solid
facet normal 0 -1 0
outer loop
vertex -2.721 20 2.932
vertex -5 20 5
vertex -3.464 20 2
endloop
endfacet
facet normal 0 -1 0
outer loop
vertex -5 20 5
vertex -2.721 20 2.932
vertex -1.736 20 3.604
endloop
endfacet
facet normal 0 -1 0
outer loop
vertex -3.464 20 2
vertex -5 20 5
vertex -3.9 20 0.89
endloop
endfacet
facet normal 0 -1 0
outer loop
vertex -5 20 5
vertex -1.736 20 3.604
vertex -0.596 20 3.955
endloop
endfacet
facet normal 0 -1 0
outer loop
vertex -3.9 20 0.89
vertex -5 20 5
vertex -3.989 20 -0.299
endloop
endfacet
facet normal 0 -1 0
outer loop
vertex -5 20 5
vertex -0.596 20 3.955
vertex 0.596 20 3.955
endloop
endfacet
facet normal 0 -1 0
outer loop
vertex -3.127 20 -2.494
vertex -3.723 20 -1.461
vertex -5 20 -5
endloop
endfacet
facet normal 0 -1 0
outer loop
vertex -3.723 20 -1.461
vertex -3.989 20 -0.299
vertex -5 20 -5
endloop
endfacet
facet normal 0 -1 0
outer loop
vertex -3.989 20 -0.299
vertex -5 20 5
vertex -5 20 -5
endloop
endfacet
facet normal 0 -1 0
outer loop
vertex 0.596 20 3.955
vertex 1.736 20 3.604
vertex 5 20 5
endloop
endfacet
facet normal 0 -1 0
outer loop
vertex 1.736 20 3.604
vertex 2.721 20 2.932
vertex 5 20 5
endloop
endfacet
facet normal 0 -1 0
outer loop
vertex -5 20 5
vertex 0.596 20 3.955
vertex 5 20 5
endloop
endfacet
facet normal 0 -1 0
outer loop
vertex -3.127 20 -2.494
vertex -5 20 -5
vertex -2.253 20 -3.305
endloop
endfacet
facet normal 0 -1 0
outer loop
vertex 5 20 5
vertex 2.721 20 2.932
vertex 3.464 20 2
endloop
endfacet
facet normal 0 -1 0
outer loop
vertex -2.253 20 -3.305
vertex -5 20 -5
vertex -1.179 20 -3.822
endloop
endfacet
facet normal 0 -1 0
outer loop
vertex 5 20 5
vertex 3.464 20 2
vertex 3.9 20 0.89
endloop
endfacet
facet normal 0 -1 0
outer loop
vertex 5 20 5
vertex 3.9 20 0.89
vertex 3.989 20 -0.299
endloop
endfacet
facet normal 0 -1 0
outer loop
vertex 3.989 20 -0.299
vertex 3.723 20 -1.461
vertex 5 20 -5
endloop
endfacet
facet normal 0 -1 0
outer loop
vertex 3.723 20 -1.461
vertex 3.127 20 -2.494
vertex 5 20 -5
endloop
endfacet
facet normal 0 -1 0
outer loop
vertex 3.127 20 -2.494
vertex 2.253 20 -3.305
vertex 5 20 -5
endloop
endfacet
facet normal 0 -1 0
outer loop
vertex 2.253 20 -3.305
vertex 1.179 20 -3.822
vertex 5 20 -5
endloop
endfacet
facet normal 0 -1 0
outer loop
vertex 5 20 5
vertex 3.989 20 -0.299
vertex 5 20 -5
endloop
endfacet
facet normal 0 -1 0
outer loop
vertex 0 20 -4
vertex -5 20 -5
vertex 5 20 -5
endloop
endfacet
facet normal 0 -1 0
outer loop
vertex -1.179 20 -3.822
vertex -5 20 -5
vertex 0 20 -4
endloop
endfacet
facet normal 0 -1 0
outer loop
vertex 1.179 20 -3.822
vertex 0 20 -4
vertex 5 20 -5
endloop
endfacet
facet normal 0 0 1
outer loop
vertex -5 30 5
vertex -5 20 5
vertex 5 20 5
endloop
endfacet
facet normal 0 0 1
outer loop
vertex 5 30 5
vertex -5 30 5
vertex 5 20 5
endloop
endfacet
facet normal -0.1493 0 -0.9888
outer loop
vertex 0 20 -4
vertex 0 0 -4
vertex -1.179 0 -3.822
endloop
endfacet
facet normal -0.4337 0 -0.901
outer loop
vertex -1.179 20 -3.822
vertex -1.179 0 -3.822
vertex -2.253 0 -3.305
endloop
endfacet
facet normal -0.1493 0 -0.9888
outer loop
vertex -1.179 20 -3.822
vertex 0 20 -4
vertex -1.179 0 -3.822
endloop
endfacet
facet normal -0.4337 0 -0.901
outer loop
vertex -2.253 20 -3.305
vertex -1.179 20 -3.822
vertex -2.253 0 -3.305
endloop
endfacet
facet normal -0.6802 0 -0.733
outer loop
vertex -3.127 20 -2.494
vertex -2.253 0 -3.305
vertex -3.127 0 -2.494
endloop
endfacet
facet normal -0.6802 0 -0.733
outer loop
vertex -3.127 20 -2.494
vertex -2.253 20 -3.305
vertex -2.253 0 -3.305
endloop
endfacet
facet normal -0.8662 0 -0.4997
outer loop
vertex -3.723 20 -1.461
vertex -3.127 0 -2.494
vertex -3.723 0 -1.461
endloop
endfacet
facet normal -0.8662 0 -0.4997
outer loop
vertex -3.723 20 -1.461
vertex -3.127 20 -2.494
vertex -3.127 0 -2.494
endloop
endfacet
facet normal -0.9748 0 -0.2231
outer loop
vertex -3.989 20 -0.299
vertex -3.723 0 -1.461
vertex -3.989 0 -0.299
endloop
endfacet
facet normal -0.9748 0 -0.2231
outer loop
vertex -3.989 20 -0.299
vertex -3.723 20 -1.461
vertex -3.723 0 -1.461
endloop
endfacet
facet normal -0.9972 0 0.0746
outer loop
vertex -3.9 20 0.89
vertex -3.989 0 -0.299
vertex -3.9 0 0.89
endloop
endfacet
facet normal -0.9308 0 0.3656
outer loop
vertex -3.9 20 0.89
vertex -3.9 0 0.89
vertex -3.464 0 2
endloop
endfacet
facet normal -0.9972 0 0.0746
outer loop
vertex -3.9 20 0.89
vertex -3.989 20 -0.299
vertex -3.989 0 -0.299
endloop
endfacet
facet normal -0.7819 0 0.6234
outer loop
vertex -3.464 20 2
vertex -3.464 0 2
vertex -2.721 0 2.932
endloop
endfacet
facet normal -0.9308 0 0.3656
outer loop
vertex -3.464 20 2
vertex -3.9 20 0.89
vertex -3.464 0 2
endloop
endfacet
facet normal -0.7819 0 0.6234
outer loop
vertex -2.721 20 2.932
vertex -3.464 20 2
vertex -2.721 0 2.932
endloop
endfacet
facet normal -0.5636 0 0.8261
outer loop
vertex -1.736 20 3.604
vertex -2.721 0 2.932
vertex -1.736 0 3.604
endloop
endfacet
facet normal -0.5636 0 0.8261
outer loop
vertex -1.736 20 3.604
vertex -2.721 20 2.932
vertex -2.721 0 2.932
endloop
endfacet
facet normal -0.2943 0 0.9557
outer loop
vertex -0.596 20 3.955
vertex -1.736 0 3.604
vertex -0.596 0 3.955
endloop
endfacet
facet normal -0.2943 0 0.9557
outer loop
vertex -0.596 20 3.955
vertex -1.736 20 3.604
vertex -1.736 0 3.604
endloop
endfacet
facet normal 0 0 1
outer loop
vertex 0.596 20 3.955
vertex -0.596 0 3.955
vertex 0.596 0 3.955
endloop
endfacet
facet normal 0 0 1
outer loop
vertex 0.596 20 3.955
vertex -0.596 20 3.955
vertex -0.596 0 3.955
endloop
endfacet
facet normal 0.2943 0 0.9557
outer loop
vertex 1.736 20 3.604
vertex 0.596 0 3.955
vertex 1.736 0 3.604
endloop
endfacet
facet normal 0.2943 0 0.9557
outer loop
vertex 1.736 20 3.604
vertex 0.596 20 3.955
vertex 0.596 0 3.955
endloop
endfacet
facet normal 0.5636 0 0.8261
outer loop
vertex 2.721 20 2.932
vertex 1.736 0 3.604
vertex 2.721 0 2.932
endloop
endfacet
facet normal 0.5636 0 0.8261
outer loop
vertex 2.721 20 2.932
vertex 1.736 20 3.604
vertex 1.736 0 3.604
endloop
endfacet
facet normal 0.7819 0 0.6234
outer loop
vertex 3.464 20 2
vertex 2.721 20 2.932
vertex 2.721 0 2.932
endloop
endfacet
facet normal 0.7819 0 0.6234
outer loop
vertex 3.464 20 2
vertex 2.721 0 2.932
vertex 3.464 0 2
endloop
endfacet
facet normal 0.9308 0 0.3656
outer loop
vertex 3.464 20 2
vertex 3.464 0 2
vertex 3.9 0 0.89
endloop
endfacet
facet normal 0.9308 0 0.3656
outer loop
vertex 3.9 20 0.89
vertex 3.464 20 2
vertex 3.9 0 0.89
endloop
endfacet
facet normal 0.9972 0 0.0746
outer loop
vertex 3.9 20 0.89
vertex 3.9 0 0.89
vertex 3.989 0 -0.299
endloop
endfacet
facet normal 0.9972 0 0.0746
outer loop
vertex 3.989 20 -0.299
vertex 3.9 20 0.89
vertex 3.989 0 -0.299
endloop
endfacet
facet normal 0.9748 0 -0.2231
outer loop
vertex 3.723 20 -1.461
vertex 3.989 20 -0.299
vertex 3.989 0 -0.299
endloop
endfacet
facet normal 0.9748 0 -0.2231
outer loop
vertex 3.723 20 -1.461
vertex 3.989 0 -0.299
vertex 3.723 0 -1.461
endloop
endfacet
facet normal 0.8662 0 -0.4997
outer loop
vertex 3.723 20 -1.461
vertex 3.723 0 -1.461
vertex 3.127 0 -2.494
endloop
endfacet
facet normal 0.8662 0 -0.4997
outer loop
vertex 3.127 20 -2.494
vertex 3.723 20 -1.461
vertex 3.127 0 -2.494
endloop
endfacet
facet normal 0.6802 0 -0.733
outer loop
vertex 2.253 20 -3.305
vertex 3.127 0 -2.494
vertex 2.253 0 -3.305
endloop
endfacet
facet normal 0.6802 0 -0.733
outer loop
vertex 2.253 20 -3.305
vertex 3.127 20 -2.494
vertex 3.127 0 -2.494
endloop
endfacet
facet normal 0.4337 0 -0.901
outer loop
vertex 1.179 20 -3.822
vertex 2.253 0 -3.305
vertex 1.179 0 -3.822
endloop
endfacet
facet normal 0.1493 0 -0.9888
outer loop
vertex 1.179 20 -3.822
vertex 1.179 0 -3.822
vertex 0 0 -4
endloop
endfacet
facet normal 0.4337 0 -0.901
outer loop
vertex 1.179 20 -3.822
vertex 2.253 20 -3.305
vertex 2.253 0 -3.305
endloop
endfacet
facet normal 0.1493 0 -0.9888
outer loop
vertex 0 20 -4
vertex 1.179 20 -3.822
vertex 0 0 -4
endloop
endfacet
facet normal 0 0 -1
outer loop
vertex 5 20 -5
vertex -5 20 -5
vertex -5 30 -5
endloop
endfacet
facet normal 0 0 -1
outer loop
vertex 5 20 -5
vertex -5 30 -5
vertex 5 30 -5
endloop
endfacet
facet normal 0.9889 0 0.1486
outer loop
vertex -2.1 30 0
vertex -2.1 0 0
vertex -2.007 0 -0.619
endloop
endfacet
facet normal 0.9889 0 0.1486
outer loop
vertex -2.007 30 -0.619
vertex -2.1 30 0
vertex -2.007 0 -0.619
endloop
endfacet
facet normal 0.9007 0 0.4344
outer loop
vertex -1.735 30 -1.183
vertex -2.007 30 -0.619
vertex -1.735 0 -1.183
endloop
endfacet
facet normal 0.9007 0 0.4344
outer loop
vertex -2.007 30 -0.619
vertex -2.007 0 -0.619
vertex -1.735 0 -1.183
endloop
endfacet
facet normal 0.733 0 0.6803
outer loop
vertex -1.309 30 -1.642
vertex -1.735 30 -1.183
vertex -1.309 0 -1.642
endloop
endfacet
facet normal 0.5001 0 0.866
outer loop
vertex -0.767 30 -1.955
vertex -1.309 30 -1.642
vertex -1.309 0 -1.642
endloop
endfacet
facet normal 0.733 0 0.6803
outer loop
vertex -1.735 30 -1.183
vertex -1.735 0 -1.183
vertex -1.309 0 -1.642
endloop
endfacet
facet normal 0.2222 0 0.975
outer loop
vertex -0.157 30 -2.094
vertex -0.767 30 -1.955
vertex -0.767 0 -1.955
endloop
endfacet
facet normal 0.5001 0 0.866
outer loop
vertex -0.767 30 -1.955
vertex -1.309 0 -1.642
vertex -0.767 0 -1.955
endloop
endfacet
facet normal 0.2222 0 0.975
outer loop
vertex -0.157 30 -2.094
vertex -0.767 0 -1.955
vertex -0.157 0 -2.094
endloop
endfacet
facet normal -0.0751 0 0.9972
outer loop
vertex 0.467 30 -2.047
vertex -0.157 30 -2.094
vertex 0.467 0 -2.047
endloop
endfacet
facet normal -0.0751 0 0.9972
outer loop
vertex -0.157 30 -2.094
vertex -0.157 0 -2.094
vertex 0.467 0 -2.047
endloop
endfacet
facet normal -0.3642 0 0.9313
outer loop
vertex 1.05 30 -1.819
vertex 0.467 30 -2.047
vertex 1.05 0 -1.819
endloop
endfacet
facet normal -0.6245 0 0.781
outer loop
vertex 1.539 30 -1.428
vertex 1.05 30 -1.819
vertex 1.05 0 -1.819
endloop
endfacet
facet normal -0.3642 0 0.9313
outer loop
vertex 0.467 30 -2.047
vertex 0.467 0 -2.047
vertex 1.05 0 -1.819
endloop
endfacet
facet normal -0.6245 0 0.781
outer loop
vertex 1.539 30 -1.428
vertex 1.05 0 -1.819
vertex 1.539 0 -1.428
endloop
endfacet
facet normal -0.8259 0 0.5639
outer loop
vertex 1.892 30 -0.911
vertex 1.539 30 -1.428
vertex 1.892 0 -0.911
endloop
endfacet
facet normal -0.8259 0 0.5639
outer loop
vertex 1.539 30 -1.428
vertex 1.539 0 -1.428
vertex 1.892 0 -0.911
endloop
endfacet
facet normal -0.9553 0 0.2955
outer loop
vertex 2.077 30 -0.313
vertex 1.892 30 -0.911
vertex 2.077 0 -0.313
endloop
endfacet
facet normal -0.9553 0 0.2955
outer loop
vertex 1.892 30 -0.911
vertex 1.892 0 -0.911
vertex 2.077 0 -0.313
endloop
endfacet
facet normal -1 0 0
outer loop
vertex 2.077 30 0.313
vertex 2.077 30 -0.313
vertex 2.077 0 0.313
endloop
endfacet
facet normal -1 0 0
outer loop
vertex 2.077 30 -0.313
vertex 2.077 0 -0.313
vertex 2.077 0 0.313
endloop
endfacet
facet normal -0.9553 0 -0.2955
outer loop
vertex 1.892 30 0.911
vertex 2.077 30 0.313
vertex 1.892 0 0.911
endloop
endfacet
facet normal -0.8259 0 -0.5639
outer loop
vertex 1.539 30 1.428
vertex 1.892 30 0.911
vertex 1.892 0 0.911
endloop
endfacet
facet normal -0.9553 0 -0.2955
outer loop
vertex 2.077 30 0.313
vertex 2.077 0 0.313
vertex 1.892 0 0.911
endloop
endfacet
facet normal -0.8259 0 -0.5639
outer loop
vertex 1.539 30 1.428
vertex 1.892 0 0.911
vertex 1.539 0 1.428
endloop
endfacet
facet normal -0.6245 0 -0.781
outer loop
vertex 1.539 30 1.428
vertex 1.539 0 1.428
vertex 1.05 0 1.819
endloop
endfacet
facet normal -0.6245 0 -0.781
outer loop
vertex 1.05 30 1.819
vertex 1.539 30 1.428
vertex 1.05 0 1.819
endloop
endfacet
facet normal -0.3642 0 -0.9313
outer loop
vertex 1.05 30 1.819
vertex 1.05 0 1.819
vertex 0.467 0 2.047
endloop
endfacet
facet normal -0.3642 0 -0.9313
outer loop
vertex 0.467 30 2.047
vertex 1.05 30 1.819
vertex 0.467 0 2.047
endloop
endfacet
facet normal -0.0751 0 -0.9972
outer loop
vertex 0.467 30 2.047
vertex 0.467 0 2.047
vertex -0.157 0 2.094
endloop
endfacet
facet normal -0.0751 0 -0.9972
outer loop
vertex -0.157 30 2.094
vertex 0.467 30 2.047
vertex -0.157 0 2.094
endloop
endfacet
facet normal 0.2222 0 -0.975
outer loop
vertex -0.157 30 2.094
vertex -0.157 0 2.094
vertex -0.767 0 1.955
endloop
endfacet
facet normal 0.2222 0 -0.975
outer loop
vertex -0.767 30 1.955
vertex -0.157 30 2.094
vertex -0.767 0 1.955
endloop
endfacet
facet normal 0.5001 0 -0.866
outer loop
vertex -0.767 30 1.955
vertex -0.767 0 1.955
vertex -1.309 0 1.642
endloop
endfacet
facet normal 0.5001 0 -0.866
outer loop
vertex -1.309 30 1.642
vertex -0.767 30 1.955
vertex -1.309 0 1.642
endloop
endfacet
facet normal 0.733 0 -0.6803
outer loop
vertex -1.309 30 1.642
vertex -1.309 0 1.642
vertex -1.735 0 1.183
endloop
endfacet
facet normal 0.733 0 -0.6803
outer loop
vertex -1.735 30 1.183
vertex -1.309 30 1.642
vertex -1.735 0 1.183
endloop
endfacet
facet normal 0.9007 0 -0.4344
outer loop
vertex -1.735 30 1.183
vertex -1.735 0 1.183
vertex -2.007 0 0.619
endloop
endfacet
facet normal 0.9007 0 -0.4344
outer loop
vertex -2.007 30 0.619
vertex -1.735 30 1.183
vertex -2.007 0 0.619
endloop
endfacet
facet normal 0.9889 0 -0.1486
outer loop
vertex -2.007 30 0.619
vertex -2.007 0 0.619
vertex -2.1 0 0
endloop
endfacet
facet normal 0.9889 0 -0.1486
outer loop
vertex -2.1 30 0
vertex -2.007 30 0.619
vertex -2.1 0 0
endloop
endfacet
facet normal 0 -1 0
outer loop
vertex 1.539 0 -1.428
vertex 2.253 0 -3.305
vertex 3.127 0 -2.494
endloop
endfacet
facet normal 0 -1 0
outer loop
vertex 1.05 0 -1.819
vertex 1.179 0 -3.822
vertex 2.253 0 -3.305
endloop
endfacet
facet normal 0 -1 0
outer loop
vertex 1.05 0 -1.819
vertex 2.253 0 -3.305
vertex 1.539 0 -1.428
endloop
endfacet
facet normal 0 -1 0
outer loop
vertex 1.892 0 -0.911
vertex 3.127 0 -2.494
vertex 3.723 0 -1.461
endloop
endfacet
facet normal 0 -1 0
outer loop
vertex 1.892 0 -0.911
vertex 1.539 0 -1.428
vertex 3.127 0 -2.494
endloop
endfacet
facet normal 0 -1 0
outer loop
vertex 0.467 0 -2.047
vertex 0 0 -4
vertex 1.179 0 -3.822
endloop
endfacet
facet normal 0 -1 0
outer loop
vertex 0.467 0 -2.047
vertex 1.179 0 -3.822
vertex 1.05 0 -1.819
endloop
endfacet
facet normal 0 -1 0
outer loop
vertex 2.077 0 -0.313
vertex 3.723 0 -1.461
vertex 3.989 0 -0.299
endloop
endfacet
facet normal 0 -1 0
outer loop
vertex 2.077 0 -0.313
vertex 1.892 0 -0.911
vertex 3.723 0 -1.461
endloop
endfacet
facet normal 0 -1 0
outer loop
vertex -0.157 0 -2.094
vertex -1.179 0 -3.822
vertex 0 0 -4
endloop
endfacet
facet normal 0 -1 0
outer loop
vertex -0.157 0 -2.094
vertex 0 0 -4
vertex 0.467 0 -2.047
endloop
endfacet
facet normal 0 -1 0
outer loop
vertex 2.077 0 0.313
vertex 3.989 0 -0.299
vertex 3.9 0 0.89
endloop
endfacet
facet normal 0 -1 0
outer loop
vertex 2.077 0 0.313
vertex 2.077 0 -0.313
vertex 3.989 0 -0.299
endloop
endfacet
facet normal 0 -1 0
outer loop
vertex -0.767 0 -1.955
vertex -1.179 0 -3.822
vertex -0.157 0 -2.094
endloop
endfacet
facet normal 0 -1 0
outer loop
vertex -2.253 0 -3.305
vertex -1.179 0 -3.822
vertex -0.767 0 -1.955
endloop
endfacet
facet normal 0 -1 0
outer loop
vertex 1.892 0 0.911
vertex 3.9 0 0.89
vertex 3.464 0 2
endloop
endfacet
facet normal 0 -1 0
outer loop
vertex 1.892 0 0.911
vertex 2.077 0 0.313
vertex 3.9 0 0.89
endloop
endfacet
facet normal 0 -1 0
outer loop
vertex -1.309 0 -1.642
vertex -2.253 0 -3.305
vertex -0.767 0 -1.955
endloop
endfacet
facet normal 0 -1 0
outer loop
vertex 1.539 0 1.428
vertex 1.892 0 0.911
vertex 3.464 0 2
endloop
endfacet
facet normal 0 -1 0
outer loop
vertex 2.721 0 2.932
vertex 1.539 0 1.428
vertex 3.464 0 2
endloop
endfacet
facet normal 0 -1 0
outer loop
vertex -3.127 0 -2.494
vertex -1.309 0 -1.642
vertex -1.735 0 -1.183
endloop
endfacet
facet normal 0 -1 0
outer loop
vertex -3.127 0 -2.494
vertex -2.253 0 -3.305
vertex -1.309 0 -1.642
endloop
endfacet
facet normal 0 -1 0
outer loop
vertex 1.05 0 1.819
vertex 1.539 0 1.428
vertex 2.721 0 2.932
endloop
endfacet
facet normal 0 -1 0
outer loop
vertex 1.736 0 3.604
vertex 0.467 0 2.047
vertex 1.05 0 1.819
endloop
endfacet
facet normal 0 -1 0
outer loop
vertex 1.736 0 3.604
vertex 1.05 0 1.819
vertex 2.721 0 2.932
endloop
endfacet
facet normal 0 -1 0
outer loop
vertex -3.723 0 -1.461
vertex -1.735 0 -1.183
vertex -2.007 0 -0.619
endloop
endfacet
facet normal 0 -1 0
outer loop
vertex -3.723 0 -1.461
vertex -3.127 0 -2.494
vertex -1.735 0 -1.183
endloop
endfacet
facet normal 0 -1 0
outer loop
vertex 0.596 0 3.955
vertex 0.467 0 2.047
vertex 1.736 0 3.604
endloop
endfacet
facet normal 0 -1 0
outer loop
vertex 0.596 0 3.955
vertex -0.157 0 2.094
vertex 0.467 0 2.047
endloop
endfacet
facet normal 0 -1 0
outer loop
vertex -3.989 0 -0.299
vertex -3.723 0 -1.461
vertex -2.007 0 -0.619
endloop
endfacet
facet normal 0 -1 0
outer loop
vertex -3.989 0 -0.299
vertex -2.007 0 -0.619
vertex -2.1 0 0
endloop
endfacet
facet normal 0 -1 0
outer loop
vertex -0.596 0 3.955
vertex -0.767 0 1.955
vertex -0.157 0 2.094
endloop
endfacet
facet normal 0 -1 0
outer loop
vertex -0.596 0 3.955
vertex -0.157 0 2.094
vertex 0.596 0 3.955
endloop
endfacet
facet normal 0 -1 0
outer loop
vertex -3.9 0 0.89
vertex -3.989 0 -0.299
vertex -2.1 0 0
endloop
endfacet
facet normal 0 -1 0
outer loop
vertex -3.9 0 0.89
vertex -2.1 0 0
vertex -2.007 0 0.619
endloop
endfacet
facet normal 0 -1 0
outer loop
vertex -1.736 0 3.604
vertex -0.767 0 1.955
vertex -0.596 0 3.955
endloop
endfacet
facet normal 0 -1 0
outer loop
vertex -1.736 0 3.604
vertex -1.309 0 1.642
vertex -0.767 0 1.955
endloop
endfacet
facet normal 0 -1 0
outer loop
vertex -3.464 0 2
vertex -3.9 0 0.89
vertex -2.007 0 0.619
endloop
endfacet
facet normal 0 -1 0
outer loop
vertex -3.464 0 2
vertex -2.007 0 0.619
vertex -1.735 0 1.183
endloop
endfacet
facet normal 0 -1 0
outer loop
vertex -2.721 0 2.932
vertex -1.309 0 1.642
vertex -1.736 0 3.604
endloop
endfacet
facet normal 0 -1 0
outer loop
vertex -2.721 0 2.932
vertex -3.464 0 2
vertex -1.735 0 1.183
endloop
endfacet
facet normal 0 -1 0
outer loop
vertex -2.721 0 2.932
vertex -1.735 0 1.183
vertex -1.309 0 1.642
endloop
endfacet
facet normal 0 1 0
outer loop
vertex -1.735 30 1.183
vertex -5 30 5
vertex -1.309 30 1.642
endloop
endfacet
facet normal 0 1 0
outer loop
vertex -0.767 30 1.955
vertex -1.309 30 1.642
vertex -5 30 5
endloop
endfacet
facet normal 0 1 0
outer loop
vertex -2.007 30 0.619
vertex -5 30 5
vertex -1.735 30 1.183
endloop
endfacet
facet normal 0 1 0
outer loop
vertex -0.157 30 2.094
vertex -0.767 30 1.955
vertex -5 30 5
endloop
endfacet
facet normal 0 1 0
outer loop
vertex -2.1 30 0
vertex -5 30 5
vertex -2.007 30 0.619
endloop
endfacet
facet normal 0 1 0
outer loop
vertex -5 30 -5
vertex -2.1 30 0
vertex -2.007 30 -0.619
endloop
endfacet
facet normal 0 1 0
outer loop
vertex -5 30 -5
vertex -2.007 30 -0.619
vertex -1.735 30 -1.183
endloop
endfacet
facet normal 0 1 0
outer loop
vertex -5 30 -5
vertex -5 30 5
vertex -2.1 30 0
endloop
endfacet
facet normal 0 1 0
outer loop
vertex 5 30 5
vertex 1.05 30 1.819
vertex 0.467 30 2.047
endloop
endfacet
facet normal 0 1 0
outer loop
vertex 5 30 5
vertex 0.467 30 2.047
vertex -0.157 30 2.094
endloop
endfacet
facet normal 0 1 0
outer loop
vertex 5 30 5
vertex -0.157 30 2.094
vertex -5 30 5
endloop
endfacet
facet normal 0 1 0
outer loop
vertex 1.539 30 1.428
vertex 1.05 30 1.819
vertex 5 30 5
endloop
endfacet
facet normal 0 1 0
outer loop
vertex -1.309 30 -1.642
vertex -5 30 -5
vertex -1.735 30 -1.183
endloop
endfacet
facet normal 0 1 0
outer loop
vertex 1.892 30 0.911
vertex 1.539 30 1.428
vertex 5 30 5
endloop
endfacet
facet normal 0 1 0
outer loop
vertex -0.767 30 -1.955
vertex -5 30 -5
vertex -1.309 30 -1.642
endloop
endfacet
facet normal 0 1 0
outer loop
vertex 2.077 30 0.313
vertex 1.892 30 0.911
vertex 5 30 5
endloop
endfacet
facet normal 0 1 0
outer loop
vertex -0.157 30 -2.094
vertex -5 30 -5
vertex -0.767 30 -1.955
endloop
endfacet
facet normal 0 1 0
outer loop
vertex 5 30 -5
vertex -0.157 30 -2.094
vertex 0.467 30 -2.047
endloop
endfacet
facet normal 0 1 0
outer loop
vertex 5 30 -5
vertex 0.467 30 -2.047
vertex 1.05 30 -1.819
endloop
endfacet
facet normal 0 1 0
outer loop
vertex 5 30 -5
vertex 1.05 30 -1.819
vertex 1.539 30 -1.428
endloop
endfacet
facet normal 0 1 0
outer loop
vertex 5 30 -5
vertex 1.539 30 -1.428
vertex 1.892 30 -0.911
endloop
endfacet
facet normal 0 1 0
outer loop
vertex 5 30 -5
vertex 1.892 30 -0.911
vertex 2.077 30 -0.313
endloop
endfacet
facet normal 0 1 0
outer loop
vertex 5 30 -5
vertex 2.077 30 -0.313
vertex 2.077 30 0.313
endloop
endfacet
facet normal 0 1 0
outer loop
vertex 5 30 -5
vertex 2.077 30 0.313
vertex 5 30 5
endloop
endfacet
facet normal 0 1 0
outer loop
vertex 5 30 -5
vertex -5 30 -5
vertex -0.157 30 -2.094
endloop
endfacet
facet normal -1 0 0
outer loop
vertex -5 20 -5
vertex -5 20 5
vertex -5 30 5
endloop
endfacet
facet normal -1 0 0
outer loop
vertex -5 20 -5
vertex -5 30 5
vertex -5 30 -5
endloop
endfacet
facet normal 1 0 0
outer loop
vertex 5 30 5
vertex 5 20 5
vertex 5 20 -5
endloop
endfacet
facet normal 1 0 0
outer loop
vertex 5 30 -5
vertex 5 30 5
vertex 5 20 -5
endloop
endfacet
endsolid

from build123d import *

# Parameters (mm, degrees)
SKIZZE1_W                       = 4
SKIZZE1_H                       = 20
SKIZZE5_W                       = 10
SKIZZE5_H                       = 10
AUFSATZ_LINEAR_AUSTRAGEN1_DEPTH = 10
M5_GEWINDEBOHRUNG2_D            = 4.2


with BuildPart() as part:
    # Skizze1 → Rotation1 (revolve)
    with BuildSketch(Plane.XY, mode=Mode.PRIVATE) as rotation1_sk:
        with Locations((2, 10)):
            Rectangle(SKIZZE1_W, SKIZZE1_H)
    revolve(rotation1_sk.sketch.rotate(Axis((0, -2.459302686, 0), (0, 1, 0)), 90), axis=Axis((0, -2.459302686, 0), (0, 1, 0)))

    # Skizze5 → Aufsatz-Linear austragen1 (add)
    with BuildSketch(Plane(origin=(0, 20, 0), x_dir=(1, 0, 0), z_dir=(0, 1, 0))):
        Rectangle(SKIZZE5_W, SKIZZE5_H)
    extrude(amount=AUFSATZ_LINEAR_AUSTRAGEN1_DEPTH)

    # M5 Gewindebohrung2 (through all)
    with Locations(Plane(origin=(0, 30, 0), x_dir=(1, 0, 0), z_dir=(0, 1, 0))):
        with Locations((0, 0)):
            Hole(M5_GEWINDEBOHRUNG2_D / 2)


solid = part.part
